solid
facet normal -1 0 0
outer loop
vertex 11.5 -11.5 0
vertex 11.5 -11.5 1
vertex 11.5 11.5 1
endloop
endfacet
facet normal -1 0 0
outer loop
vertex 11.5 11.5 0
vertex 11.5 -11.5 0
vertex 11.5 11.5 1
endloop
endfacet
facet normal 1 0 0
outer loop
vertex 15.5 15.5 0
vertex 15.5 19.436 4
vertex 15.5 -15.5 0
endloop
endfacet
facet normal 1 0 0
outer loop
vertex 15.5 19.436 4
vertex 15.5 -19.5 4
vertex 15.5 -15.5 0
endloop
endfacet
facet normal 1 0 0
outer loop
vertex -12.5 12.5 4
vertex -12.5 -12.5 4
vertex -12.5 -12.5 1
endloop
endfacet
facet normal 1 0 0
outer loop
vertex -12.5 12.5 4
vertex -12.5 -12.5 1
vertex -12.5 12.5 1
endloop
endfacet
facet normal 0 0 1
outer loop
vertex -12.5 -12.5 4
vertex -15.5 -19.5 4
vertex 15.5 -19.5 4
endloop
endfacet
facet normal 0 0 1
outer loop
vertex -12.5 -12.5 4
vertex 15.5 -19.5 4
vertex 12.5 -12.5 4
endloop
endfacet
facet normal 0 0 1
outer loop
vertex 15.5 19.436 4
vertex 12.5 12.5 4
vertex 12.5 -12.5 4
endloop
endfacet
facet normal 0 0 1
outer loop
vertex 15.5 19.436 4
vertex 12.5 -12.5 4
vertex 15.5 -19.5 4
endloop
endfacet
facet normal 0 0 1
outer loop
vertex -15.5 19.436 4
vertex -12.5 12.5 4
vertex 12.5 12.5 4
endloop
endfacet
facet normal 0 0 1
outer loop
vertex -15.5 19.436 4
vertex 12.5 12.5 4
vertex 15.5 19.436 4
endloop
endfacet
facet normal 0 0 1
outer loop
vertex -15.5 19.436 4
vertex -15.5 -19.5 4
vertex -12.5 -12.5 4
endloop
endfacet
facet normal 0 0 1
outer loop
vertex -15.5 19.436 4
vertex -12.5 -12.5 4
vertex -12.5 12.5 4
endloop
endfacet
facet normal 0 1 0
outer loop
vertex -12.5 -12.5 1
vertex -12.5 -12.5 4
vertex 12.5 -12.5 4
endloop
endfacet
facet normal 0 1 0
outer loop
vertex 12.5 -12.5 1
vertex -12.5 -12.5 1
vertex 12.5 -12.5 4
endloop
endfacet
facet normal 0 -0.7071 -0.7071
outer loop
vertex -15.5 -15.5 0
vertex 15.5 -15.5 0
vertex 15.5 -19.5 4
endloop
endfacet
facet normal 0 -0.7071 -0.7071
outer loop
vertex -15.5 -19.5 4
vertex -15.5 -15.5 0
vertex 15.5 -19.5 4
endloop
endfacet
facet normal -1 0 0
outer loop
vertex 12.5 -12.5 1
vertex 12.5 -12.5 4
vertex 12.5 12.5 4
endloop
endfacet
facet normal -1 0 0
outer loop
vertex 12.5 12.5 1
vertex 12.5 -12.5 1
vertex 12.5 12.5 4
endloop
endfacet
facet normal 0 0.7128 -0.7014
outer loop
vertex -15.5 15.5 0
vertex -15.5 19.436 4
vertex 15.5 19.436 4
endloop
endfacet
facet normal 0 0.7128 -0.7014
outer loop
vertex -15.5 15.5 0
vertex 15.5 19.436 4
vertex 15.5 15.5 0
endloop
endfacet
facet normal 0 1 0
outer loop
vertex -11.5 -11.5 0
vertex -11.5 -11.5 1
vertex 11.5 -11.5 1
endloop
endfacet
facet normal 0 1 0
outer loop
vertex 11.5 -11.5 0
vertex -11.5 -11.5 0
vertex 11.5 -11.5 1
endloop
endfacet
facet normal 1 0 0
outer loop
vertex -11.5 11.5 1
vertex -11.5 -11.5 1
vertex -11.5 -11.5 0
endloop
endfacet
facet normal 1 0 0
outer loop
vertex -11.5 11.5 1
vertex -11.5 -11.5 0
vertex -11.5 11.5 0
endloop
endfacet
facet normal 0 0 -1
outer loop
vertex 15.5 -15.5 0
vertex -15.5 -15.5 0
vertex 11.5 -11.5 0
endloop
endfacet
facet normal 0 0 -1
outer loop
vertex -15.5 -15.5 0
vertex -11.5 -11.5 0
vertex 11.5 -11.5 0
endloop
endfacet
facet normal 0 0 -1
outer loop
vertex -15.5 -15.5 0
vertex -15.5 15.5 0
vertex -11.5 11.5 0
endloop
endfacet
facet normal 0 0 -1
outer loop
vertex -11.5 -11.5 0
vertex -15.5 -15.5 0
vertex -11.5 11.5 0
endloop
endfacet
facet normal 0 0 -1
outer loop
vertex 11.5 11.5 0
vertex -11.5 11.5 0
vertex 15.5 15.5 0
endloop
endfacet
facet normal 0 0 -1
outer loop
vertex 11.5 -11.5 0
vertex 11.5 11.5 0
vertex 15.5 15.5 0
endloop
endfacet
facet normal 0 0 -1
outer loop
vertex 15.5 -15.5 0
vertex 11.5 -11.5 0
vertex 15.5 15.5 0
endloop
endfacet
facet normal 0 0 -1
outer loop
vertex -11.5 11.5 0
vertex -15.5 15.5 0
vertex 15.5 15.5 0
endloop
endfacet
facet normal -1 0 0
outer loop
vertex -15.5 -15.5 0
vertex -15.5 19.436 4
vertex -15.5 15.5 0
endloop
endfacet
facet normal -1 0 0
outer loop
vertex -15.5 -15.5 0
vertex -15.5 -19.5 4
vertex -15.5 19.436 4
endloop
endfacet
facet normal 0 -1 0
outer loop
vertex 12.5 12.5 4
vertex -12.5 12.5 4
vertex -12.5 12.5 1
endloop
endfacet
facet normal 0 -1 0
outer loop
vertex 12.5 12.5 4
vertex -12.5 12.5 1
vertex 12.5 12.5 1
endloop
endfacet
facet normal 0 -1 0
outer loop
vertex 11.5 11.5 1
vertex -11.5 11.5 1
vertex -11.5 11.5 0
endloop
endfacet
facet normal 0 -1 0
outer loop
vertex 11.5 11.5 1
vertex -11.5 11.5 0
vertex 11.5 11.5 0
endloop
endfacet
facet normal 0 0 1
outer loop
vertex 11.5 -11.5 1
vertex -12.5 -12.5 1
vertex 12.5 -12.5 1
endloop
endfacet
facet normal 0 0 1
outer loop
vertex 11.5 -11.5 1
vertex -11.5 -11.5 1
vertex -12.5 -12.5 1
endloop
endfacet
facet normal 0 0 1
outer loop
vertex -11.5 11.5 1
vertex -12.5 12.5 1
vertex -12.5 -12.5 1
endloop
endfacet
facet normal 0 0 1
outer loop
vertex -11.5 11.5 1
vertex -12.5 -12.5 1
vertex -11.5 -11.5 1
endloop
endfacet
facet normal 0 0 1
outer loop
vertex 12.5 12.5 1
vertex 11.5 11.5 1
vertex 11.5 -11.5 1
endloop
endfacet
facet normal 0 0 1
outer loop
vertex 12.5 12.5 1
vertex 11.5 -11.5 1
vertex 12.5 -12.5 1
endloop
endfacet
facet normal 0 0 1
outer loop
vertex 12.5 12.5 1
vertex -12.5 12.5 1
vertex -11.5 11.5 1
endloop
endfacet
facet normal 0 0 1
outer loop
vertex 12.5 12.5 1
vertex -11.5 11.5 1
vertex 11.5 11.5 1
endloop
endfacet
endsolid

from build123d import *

# Parameters (mm, degrees)
SKETCH3_W           = 31
SKETCH3_H           = 31
BOSS_EXTRUDE2_DEPTH = 4
SKETCH4_W           = 25
SKETCH4_H           = 25
CUT_EXTRUDE1_DEPTH  = 3
SKETCH5_W           = 23
SKETCH5_H           = 23
CUT_EXTRUDE2_DEPTH  = 5


with BuildPart() as part:
    # Sketch3 → Boss-Extrude2 (new body)
    with BuildSketch(Plane.XY):
        Rectangle(SKETCH3_W, SKETCH3_H)
    extrude(amount=BOSS_EXTRUDE2_DEPTH)

    # Sketch4 → Cut-Extrude1 (cut)
    with BuildSketch(Plane.XY.offset(4)):
        Rectangle(SKETCH4_W, SKETCH4_H)
    extrude(amount=-CUT_EXTRUDE1_DEPTH, mode=Mode.SUBTRACT)

    # Sketch5 → Cut-Extrude2 (cut)
    with BuildSketch(Plane.XY.offset(1)):
        Rectangle(SKETCH5_W, SKETCH5_H)
    extrude(amount=-CUT_EXTRUDE2_DEPTH, mode=Mode.SUBTRACT)

    # Sweep1: sweep along a curve in space
    with BuildLine() as sweep1_path:
        Line((-15.5, -15.5, 4), (15.5, -15.5, 4))
    # Sketch6 → Sweep1 (sweep)
    with BuildSketch(Plane.ZY.offset(15.5)):
        Polygon((4, -15.5), (4, -19.5), (0, -15.5), align=None)
    sweep(path=sweep1_path.line)

    # Sweep2: sweep along a curve in space
    with BuildLine() as sweep2_path:
        Line((15.5, 15.5, 0), (-15.5, 15.5, 0))
    # Sketch8 → Sweep2 (sweep)
    with BuildSketch(Plane.ZY.offset(15.5)):
        Polygon((0, 15.5), (4, 19.43634716), (4, 15.5), align=None)
    sweep(path=sweep2_path.line)


solid = part.part
